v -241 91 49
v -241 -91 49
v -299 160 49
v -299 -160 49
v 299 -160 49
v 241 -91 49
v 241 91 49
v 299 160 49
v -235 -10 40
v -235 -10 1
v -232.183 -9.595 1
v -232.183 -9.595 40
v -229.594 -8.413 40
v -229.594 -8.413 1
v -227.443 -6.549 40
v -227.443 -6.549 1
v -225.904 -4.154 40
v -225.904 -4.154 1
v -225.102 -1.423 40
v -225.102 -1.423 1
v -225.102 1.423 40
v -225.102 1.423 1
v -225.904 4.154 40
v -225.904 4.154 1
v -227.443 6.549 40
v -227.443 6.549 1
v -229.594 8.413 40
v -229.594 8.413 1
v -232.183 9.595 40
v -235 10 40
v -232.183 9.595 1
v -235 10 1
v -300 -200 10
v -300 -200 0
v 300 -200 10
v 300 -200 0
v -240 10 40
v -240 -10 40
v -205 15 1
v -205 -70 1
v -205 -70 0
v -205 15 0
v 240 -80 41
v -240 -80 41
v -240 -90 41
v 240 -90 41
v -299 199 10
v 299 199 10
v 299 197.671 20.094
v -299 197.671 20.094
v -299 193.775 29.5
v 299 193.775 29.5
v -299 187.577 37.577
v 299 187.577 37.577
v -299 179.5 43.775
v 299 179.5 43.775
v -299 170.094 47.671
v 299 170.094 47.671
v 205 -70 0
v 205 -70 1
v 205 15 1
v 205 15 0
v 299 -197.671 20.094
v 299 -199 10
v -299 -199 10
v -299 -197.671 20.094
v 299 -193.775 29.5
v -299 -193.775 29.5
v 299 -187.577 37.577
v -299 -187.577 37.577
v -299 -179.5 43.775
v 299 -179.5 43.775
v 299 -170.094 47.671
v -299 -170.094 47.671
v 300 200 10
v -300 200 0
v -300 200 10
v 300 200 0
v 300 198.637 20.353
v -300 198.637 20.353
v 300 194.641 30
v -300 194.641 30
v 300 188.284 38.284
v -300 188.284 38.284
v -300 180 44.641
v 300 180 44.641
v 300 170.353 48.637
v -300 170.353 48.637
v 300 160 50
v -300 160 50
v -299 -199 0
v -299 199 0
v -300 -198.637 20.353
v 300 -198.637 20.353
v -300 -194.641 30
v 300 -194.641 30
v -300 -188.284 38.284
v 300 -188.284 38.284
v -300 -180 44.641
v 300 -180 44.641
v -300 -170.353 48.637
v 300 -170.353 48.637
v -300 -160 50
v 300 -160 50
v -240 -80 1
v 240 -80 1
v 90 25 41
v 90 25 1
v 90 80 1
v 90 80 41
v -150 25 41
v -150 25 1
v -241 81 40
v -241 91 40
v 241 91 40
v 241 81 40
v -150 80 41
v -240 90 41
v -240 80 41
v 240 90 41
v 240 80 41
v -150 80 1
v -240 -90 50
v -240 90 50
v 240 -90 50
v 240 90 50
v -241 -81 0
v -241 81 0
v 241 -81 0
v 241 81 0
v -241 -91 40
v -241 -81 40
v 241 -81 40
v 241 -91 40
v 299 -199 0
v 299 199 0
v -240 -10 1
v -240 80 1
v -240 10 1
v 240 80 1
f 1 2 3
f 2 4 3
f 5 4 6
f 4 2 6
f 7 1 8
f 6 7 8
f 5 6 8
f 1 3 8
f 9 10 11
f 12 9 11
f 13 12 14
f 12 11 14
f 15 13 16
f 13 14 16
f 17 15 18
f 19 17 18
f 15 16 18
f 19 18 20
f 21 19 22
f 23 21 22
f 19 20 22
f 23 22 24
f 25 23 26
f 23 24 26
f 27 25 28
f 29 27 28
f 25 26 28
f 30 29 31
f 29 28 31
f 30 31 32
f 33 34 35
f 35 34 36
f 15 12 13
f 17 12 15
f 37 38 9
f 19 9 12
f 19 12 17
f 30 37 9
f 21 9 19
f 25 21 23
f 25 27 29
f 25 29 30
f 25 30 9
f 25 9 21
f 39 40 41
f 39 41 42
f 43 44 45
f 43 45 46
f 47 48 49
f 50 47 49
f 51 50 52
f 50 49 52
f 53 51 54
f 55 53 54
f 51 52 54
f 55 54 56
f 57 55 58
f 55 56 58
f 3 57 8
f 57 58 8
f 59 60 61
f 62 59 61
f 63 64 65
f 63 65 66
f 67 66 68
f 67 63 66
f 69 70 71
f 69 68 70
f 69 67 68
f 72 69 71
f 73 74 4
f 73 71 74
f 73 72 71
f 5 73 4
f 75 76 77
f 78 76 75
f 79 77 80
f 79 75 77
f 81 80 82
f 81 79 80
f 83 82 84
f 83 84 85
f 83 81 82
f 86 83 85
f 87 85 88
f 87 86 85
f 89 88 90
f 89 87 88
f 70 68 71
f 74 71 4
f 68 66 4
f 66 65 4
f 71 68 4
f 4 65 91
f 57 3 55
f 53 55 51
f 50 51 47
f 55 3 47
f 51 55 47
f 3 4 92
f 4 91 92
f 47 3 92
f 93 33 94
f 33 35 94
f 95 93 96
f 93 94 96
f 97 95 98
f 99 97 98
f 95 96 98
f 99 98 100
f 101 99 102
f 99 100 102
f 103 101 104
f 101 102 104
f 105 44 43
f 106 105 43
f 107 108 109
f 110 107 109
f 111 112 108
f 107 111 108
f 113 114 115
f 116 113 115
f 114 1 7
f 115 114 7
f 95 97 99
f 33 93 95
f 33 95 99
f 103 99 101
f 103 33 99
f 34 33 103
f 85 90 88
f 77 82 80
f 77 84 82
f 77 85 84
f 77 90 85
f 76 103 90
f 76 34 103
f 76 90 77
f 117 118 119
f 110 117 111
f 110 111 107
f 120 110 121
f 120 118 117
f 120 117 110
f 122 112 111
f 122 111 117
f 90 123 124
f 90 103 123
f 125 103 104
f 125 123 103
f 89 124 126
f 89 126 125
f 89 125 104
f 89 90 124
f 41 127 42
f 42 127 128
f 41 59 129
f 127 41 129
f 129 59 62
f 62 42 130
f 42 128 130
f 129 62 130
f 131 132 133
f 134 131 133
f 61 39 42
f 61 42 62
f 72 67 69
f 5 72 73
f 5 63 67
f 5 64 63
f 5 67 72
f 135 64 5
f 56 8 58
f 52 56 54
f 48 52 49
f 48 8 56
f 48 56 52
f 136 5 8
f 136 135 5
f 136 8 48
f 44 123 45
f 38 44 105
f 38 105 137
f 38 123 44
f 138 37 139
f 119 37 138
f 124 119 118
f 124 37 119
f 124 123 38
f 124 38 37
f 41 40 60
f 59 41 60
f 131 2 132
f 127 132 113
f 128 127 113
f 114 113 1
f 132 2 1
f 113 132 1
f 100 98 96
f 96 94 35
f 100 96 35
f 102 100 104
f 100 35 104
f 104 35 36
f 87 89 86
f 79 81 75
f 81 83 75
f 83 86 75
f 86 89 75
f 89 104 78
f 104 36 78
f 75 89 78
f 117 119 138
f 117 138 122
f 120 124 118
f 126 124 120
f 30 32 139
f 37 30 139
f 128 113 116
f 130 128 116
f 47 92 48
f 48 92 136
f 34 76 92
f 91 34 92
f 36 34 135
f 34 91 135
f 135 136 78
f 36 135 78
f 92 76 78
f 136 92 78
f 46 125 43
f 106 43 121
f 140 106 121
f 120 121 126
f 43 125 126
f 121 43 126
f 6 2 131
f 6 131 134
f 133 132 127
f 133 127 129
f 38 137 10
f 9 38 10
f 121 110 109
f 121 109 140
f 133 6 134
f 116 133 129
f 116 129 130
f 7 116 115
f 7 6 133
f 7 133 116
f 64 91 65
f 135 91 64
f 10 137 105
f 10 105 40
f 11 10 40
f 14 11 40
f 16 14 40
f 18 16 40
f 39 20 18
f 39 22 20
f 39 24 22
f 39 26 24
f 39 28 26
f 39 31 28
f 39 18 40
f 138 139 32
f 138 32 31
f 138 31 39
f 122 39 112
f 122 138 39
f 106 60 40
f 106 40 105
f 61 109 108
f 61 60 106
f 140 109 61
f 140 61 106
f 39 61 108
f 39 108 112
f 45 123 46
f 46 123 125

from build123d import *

# Parameters (mm, degrees)
F0_W      = 600
F0_H      = 400
F1_DEPTH  = 50
F2_R      = 40
F3_W      = 480
F3_H      = 160
F4_DEPTH  = 49
F5_W      = 480
F5_H      = 10
F6_DEPTH  = 9
F7_T      = -1
F8_W      = 410
F8_H      = 85
F9_DEPTH  = 1.001
F10_W     = 240
F10_H     = 55
F11_DEPTH = 40
F13_DEPTH = 39


with BuildPart() as f1:
    # F0 (on Top) → F1 (new body)
    with BuildSketch(Plane.XY):
        Rectangle(F0_W, F0_H)
    extrude(amount=F1_DEPTH)

    # F2
    f2_edges = [f1.edges().sort_by_distance(p)[0] for p in [
        (0, -200, 50),
        (0, 200, 50),
    ]]
    fillet(f2_edges, radius=F2_R)

    # F3 (on face) → F4 (cut)
    with BuildSketch(Plane.XY.offset(50)):
        Rectangle(F3_W, F3_H)
    extrude(amount=-F4_DEPTH, mode=Mode.SUBTRACT)

    # F5 (on face) → F6 (cut)
    with BuildSketch(Plane.XY.offset(50)):
        with Locations((0, 85)):
            Rectangle(F5_W, F5_H)
        with Locations((0, -85)):
            Rectangle(F5_W, F5_H)
    extrude(amount=-F6_DEPTH, mode=Mode.SUBTRACT)

    # F7
    f7_openings = [f1.faces().sort_by_distance(p)[0] for p in [
        (0, 0, 0),
    ]]
    offset(amount=F7_T, openings=f7_openings, kind=Kind.INTERSECTION)

    # F8 (on face) → F9 (cut, through all)
    with BuildSketch(Plane.XY.offset(1)):
        with Locations((0, -27.5)):
            Rectangle(F8_W, F8_H)
    extrude(amount=-F9_DEPTH, mode=Mode.SUBTRACT)

    # F10 (on face) → F11 (join)
    with BuildSketch(Plane.XY.offset(1)):
        with Locations((-30, 52.5)):
            Rectangle(F10_W, F10_H)
    extrude(amount=F11_DEPTH)

    # F12 (on face) → F13 (join)
    with BuildSketch(Plane.XY.offset(1)):
        with BuildLine():
            Line((-240, -10), (-235, -10))
            ThreePointArc((-235, -10), (-225, 0), (-235, 10))
            Line((-235, 10), (-240, 10))
            Line((-240, 10), (-240, -10))
        make_face()
    extrude(amount=F13_DEPTH)


solid = f1.part
